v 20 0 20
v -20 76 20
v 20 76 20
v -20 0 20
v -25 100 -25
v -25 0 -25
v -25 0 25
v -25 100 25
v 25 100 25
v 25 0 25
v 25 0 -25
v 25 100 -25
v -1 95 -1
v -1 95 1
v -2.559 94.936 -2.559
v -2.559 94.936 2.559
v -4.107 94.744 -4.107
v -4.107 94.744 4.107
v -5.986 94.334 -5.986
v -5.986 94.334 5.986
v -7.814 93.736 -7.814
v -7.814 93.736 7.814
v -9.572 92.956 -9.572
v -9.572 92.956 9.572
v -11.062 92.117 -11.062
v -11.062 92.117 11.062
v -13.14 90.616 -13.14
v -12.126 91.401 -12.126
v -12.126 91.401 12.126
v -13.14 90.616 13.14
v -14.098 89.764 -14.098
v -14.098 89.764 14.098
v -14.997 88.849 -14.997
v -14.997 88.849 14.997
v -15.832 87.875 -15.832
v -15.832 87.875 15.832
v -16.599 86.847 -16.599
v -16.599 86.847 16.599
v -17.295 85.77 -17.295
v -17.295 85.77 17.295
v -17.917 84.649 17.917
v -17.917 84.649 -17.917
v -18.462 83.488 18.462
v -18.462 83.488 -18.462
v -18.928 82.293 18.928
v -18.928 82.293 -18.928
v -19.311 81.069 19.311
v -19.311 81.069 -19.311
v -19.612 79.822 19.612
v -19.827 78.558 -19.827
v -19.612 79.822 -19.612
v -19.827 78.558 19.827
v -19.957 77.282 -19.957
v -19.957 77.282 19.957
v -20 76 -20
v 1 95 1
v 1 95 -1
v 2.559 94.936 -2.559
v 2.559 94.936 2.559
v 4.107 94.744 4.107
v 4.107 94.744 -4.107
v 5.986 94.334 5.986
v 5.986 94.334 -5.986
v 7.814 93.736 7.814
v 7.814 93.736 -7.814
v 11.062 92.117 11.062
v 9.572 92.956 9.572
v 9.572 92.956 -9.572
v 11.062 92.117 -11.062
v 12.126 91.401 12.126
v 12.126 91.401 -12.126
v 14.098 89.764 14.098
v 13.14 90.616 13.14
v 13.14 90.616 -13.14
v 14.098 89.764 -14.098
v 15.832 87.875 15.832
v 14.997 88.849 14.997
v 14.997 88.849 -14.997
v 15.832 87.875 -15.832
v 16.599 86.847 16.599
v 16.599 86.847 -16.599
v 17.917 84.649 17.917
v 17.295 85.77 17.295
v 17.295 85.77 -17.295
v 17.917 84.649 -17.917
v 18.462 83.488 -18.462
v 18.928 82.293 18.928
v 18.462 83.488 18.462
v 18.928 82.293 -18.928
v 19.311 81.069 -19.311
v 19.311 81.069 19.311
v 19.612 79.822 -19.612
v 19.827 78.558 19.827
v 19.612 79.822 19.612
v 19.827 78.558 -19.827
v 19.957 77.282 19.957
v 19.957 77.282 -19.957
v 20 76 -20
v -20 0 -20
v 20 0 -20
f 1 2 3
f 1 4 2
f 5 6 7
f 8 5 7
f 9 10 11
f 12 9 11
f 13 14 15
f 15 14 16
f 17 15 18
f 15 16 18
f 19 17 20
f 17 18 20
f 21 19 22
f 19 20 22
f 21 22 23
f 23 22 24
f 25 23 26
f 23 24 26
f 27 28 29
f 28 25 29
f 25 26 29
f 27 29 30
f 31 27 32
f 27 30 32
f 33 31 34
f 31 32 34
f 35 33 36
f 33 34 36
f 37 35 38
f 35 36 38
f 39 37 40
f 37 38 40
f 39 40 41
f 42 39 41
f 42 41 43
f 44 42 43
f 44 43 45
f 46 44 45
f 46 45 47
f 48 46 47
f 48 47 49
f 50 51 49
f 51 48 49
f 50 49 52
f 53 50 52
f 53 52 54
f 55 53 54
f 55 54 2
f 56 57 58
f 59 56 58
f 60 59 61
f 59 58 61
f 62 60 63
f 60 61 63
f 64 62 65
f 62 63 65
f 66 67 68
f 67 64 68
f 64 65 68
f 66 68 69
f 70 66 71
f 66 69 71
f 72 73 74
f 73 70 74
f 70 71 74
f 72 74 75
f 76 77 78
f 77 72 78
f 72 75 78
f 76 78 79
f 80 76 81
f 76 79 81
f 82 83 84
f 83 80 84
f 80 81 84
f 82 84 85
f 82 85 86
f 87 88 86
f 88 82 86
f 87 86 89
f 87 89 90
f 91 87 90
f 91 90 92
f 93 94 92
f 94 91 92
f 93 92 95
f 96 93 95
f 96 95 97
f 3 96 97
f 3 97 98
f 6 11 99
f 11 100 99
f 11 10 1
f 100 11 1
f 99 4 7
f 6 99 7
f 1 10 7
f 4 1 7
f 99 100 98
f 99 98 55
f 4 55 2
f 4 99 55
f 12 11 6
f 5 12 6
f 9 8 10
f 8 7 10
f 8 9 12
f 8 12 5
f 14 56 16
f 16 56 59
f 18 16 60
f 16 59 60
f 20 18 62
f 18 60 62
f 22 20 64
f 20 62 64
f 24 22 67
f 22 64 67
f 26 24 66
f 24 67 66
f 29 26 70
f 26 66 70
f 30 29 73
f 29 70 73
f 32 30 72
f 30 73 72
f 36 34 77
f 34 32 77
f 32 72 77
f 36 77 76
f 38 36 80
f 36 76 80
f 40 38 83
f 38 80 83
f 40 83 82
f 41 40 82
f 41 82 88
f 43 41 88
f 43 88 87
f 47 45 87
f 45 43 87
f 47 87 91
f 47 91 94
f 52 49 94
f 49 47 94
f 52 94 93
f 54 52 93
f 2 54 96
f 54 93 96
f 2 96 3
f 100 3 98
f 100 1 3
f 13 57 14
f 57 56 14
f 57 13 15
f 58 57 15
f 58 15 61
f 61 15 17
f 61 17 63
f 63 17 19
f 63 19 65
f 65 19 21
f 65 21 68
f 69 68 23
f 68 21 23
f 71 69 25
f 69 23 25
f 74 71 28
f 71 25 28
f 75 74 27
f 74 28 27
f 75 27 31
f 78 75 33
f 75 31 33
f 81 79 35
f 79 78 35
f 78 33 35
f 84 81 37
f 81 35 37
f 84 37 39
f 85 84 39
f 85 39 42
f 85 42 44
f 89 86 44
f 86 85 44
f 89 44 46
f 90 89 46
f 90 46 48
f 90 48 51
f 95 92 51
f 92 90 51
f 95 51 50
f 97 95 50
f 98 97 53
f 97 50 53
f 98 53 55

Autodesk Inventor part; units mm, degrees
ref_plane "YZ Plane" through (0, 0, 0) normal (1, 0, 0) x (0, 1, 0)
ref_plane "XZ Plane" through (0, 0, 0) normal (0, 1, 0) x (-1, 0, 0)
ref_plane "XY Plane" through (0, 0, 0) normal (0, 0, 1) x (1, 0, 0)
sketch "Sketch1" plane through (0, 0, 0) normal (0, 1, 0) x (-1, 0, 0)
  line L0 (25, 25) -> (-25, 25)
  line L1 (-25, 25) -> (-25, -25)
  line L2 (-25, -25) -> (25, -25)
  line L3 (25, -25) -> (25, 25)
  line L4 (25, 25) -> (-25, -25) construction
  line L5 (-25, 25) -> (25, -25) construction
  point P0 (0, 0)
  dimension "d0" = 50
  dimension "d1" = 50
extrude "Extrusion1" add sketch "Sketch1" along normal blind 100
shell "Shell1" thickness 5 removed faces 1 at (8.3333, 0, -8.3333)
fillet "Fillet1" radius 19 4 edges at (0, 95, 20) (20, 95, 0) (-20, 95, 0) (0, 95, -20)
equation "\"d1\" = d0"
properties part number "traffic sign"
